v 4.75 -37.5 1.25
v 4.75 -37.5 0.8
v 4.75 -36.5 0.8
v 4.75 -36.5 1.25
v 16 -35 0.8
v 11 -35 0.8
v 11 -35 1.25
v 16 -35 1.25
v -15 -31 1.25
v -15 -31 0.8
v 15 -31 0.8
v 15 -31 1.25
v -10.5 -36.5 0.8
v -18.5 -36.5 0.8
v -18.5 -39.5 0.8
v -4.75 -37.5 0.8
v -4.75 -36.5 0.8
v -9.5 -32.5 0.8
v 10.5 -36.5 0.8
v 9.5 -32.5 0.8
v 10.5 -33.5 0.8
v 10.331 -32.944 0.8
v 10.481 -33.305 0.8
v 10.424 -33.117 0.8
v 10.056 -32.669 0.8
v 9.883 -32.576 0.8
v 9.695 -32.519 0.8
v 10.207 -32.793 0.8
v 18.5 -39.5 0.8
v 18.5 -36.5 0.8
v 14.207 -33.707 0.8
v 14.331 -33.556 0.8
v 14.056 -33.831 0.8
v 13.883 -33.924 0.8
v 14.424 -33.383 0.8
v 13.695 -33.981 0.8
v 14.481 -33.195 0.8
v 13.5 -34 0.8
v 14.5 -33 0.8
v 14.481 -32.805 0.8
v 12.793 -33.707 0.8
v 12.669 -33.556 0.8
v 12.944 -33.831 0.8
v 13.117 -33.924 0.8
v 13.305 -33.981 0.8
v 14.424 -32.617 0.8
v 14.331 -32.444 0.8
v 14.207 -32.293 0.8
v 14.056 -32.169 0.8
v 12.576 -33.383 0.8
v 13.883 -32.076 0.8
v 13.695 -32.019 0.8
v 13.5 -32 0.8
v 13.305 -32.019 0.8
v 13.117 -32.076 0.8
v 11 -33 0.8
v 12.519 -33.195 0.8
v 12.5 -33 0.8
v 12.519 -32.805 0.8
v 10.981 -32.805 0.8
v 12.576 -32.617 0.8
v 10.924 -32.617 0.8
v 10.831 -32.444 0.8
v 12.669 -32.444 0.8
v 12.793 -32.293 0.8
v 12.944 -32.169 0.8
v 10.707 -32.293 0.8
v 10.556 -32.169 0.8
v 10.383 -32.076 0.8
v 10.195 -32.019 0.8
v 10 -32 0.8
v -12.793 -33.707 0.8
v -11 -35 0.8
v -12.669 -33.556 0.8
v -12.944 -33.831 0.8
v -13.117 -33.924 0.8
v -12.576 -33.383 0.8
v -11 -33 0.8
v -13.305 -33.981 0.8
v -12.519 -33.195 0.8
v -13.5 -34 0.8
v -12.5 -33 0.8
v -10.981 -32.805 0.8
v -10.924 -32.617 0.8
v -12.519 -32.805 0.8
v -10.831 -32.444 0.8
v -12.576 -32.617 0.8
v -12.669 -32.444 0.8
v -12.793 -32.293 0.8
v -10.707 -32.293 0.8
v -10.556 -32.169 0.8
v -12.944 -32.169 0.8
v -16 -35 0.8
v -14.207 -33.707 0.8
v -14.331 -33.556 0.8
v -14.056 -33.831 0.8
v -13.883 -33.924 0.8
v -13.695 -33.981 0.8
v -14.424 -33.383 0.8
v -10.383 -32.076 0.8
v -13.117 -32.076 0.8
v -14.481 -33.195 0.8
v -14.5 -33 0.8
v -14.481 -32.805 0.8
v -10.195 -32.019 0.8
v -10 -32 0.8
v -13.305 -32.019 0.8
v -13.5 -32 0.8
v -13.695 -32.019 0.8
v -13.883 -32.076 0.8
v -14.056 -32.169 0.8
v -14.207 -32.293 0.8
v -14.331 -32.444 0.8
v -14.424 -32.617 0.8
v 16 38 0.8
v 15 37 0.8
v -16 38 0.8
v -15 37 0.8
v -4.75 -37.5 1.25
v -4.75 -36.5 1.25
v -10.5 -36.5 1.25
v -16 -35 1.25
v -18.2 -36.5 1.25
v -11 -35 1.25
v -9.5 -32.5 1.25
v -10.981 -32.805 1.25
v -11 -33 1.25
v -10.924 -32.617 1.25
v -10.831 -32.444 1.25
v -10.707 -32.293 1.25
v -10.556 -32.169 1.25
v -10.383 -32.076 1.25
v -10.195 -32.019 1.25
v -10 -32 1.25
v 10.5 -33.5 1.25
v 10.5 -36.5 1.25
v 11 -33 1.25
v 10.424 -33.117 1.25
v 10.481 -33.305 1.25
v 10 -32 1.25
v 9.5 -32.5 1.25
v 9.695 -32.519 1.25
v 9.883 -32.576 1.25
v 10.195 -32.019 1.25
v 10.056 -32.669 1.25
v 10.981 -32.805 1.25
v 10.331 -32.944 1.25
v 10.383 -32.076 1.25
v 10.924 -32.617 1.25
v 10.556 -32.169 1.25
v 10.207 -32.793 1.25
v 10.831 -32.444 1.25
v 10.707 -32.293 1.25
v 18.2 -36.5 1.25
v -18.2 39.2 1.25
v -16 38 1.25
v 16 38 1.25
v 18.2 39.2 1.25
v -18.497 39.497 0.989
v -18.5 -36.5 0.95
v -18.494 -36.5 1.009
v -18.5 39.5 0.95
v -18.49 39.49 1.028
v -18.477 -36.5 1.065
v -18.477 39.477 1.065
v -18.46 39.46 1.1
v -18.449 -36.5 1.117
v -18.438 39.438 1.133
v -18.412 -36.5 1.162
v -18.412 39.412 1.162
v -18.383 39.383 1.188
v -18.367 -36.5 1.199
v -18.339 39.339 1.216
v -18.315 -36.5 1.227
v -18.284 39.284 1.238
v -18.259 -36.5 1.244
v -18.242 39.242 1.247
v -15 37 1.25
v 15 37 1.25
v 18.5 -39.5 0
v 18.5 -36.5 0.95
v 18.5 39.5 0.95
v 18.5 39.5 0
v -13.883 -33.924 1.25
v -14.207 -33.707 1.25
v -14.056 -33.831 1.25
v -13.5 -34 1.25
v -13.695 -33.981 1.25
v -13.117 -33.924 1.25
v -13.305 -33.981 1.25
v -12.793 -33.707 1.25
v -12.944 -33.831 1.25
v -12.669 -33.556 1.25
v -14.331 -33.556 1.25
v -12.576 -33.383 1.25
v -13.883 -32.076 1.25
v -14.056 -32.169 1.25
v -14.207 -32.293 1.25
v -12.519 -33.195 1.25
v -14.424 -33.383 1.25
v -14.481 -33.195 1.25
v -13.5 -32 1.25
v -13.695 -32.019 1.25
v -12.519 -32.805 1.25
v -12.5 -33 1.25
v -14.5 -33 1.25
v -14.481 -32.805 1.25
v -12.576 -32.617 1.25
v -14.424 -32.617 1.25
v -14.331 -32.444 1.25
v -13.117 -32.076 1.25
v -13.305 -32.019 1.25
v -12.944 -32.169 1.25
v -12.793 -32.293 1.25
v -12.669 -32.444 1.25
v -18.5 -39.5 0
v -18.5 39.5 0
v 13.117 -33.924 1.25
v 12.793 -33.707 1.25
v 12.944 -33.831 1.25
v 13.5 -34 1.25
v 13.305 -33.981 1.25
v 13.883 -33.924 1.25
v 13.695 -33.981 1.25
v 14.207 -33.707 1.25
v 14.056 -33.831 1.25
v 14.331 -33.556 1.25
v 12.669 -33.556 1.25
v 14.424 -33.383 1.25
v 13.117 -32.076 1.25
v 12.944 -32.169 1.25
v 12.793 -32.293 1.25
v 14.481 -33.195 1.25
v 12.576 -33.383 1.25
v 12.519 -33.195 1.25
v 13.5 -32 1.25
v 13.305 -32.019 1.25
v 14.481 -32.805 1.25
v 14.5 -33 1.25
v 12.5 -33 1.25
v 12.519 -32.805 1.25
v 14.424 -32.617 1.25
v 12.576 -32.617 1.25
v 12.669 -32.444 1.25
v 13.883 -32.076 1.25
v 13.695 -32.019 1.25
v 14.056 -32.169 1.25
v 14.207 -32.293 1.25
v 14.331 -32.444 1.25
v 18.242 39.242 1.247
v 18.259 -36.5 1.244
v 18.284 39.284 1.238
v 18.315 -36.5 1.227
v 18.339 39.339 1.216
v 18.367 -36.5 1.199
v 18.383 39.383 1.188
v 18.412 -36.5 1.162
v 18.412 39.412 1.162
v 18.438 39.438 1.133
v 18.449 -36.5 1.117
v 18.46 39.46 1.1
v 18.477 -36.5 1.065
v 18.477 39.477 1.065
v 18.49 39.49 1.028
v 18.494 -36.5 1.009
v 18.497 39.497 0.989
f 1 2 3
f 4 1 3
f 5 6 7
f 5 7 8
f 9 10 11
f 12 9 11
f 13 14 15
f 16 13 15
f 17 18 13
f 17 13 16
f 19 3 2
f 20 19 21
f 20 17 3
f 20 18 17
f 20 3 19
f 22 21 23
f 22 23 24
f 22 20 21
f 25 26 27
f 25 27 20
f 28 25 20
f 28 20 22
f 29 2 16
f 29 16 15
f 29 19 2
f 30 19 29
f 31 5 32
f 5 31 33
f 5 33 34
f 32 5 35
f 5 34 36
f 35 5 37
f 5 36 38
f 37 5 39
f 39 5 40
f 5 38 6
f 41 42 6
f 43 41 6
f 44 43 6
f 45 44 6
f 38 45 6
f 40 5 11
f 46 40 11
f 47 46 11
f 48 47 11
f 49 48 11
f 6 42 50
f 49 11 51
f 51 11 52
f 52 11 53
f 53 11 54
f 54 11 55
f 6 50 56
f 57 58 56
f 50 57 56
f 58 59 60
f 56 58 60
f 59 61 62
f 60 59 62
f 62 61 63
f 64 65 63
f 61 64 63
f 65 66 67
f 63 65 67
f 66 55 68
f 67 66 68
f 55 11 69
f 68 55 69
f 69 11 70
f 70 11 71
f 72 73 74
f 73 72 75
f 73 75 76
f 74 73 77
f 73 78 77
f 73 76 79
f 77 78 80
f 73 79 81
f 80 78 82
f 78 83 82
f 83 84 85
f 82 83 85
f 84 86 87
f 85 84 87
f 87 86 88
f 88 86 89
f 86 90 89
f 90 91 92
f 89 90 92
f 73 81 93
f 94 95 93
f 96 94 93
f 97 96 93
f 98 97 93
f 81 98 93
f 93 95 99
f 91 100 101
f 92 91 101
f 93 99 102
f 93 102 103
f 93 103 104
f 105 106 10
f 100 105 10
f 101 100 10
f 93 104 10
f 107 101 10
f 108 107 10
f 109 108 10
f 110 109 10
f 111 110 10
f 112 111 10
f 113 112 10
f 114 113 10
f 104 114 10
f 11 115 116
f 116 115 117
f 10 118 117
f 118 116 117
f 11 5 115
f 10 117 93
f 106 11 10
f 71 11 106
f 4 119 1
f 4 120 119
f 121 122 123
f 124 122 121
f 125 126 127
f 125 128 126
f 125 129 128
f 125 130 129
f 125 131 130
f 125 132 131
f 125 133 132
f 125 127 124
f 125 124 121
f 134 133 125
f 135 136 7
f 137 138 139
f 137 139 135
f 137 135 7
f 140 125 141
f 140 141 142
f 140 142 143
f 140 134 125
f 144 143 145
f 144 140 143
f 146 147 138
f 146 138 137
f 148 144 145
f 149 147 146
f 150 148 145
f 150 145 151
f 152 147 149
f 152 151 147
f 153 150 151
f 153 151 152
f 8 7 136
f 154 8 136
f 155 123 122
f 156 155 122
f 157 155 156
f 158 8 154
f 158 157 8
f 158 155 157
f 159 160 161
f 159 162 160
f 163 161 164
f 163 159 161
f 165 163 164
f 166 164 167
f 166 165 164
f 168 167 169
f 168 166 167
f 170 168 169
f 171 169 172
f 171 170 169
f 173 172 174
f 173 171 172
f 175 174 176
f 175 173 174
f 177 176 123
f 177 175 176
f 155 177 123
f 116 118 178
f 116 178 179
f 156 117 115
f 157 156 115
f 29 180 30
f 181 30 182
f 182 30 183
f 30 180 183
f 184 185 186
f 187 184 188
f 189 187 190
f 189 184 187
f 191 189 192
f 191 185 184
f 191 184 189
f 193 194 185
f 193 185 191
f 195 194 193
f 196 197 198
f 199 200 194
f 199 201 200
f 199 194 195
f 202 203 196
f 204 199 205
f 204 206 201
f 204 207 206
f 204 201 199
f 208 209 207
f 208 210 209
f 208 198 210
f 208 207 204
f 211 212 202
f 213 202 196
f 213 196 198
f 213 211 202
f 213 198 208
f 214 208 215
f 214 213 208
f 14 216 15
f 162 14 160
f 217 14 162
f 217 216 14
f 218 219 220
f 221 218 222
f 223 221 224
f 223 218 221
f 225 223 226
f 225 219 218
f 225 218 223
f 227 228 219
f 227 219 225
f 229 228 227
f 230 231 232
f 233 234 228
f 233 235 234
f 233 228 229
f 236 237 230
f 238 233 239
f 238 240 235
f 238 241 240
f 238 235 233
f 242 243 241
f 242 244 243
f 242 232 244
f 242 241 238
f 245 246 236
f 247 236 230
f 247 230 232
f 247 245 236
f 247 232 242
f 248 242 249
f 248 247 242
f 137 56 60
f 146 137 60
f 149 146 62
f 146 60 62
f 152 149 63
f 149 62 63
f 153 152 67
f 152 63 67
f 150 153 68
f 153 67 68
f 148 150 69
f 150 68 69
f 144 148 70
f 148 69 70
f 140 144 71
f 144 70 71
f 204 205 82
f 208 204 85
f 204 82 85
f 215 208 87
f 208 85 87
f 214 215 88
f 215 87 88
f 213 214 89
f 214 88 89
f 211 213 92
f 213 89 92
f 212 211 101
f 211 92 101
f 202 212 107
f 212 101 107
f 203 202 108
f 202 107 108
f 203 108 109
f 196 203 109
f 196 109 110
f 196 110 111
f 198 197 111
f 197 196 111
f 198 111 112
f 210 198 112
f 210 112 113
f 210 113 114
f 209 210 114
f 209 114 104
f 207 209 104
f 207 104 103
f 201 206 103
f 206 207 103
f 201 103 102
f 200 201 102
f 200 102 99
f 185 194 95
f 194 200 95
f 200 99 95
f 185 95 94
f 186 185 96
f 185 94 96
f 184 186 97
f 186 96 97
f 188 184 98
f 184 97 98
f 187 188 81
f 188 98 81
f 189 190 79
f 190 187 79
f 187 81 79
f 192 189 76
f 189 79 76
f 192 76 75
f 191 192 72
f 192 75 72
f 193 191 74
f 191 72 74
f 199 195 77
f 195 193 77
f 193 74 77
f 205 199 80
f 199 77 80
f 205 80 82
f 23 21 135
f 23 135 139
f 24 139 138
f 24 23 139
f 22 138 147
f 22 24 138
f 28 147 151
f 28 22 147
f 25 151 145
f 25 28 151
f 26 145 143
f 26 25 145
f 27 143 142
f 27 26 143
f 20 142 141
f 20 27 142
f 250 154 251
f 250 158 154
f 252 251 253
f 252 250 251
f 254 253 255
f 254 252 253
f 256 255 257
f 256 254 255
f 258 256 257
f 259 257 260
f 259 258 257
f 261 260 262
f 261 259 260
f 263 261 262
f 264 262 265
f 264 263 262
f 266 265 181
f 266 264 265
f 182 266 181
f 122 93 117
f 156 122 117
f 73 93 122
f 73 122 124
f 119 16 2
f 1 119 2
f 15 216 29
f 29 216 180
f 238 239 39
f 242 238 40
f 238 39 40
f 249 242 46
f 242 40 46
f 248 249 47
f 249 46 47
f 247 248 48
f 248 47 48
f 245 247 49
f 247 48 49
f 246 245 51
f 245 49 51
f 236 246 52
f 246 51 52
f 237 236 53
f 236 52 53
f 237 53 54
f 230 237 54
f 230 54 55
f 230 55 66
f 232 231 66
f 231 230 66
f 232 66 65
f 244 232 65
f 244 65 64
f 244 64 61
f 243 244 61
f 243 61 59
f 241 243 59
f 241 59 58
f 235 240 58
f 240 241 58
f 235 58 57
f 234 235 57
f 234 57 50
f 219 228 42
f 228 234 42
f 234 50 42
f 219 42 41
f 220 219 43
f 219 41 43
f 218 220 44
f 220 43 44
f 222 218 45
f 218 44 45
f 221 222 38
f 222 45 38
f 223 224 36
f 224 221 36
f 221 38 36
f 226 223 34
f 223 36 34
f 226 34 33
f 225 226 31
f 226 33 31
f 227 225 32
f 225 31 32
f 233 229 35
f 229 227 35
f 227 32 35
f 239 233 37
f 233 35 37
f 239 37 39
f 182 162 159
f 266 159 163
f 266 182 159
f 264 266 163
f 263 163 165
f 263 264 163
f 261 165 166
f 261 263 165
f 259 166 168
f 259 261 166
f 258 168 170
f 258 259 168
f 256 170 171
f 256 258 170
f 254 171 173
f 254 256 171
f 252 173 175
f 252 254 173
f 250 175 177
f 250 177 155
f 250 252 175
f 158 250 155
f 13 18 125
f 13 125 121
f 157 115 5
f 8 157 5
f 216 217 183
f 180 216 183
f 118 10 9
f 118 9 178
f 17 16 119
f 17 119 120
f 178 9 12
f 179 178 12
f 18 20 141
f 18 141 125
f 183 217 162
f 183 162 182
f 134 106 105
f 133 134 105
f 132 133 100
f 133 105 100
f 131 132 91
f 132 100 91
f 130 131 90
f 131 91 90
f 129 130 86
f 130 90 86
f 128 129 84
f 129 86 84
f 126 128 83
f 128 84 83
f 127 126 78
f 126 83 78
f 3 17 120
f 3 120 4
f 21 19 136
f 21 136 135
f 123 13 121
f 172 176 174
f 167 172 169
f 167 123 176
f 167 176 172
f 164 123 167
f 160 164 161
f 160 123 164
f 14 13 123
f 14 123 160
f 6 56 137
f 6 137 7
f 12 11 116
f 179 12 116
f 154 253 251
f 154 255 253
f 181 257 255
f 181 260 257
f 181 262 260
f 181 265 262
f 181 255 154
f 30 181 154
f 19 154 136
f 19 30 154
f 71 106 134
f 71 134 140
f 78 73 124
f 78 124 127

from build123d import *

# Parameters (mm, degrees)
SKETCH001002046_W = 37
SKETCH001002046_H = 79
PAD033_DEPTH      = 1.25
SKETCH001002042_R = 1
SKETCH001002042_W = 30
SKETCH001002042_H = 68
POCKET017_DEPTH   = 1
SKETCH001002049_W = 9.5
SKETCH001002049_H = 1
POCKET018_DEPTH   = 1
FILLET038_R       = 0.3


with BuildPart() as part:
    # Sketch001002046 → Pad033 (new body)
    with BuildSketch(Plane.XY):
        Rectangle(SKETCH001002046_W, SKETCH001002046_H)
    extrude(amount=PAD033_DEPTH)

    # Sketch001002042 → Pocket017 (cut)
    with BuildSketch(Plane.XY.offset(0.8)):
        with BuildLine():
            Line((-16, 38), (16, 38))
            Line((16, 38), (16, -35))
            Line((11, -35), (16, -35))
            Line((11, -33), (11, -35))
            ThreePointArc((11, -33), (10.707107, -32.292893), (10, -32))
            Line((-10, -32), (10, -32))
            ThreePointArc((-10, -32), (-10.707107, -32.292893), (-11, -33))
            Line((-11, -35), (-11, -33))
            Line((-16, -35), (-11, -35))
            Line((-16, -35), (-16, 38))
        make_face()
        with Locations((-13.5, -33)):
            Circle(SKETCH001002042_R, mode=Mode.SUBTRACT)
        with Locations((13.5, -33)):
            Circle(SKETCH001002042_R, mode=Mode.SUBTRACT)
        with Locations((0, 3)):
            Rectangle(SKETCH001002042_W, SKETCH001002042_H, mode=Mode.SUBTRACT)
    extrude(amount=POCKET017_DEPTH, mode=Mode.SUBTRACT)

    # Sketch001002049 → Pocket018 (cut)
    with BuildSketch(Plane.XY.offset(0.8)):
        with BuildLine():
            Line((-18.5, -39.5), (18.5, -39.5))
            Line((18.5, -39.5), (18.5, -36.5))
            Line((18.5, -36.5), (10.5, -36.5))
            Line((10.5, -36.5), (10.5, -33.5))
            ThreePointArc((10.5, -33.5), (10.207107, -32.792893), (9.5, -32.5))
            Line((9.5, -32.5), (-9.5, -32.5))
            Line((-9.5, -32.5), (-10.5, -36.5))
            Line((-10.5, -36.5), (-18.5, -36.5))
            Line((-18.5, -36.5), (-18.5, -39.5))
        make_face()
        with Locations((0, -37)):
            Rectangle(SKETCH001002049_W, SKETCH001002049_H, mode=Mode.SUBTRACT)
    extrude(amount=POCKET018_DEPTH, mode=Mode.SUBTRACT)

    # Fillet038
    fillet038_edges = [part.edges().sort_by_distance(p)[0] for p in [
        (0, 39.5, 1.25),
        (-18.5, 1.5, 1.25),
        (18.5, 1.5, 1.25),
    ]]
    fillet(fillet038_edges, radius=FILLET038_R)


solid = part.part
